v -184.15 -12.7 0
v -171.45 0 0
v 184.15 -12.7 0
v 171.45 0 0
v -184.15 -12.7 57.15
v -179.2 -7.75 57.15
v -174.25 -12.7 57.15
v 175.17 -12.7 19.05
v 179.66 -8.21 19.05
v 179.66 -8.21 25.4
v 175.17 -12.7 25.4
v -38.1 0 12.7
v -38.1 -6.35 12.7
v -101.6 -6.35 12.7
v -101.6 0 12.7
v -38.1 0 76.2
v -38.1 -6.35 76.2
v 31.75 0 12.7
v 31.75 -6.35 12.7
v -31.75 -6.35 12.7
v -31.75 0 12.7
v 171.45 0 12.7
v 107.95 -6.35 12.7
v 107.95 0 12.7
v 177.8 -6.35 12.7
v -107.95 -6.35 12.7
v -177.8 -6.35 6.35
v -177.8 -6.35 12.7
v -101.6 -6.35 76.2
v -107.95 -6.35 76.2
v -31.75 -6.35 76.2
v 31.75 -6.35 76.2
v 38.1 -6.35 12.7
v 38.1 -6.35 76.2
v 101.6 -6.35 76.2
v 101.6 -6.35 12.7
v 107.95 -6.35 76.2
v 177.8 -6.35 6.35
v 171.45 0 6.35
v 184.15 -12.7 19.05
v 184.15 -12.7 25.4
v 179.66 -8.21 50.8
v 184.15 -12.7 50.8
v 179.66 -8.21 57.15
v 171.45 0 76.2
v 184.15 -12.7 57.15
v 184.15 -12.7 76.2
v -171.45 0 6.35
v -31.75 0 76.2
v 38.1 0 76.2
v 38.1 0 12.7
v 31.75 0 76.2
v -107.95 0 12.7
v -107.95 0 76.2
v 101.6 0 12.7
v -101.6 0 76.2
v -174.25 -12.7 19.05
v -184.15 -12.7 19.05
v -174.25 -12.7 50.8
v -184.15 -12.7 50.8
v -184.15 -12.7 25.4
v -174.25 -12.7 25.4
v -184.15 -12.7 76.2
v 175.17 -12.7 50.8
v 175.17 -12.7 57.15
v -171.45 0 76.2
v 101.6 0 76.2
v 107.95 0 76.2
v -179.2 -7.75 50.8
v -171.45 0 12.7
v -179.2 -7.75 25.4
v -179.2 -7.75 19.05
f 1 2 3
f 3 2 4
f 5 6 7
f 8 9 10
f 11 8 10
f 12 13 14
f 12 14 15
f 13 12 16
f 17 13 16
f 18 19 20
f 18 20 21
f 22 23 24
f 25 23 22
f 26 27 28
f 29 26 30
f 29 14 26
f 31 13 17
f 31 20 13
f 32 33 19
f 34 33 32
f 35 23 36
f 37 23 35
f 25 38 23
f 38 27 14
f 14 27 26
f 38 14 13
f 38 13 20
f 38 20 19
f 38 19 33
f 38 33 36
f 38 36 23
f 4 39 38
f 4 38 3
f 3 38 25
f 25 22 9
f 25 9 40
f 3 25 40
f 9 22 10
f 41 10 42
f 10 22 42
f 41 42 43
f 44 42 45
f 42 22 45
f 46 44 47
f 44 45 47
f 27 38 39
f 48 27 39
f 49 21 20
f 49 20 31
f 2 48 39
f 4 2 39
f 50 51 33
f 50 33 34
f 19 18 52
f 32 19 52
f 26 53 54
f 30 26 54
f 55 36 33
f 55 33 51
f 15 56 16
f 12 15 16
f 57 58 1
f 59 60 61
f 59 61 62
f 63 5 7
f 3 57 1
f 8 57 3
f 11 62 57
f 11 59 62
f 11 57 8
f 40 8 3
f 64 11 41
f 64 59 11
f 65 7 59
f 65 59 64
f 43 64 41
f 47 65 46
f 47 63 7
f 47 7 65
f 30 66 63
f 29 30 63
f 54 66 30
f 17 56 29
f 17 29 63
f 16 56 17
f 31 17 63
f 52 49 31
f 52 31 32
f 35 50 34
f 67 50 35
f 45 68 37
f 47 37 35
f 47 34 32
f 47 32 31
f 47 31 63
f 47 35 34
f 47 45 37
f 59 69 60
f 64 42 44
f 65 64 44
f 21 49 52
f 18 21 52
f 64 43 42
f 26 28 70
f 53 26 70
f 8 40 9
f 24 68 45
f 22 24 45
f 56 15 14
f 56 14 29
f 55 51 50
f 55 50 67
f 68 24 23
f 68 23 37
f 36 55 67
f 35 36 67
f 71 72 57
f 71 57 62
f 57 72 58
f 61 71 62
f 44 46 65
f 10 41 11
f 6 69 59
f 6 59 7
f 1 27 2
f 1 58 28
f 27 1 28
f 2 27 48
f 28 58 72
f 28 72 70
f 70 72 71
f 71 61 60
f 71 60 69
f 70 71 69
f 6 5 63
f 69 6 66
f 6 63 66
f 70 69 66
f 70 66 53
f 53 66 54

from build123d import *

# Parameters (mm, degrees)
F0_W      = 368.3
F0_H      = 76.2
F1_DEPTH  = 12.7
F2_W      = 6.35
F2_H      = 6.35
F3_DEPTH  = 368.301
F5_DEPTH  = 76.201
F6_W      = 6.35
F6_H      = 63.5
F7_DEPTH  = 6.35
F8_W      = 7.000554
F8_H      = 6.35
F9_DEPTH  = 260.428428
F10_W     = 6.35
F10_H     = 6.35
F11_DEPTH = 260.428428


with BuildPart() as f1:
    # F0 (on Front) → F1 (new body)
    with BuildSketch(Plane.XZ):
        with Locations((0, 38.1)):
            Rectangle(F0_W, F0_H)
    extrude(amount=F1_DEPTH)

    # F2 (on face) → F3 (cut, through all)
    with BuildSketch(Plane.YZ.offset(184.15)):
        with Locations((-3.175, 9.525)):
            Rectangle(F2_W, F2_H)
    extrude(amount=-F3_DEPTH, mode=Mode.SUBTRACT)

    # F4 (on face) → F5 (cut, through all)
    with BuildSketch(Plane.XY.offset(76.2)):
        Polygon((-184.15, 0), (-184.15, -12.7), (-171.45, 0), align=None)
        Polygon((184.15, -12.7), (184.15, 0), (171.45, 0), align=None)
    extrude(amount=-F5_DEPTH, mode=Mode.SUBTRACT)

    # F6 (on face) → F7 (cut)
    with BuildSketch(Plane(origin=(0, 0, 0), x_dir=(-1, 0, 0), z_dir=(0, 1, 0))):
        with Locations((-104.775, 44.45)):
            Rectangle(F6_W, F6_H)
        with Locations((-34.925, 44.45)):
            Rectangle(F6_W, F6_H)
        with Locations((34.925, 44.45)):
            Rectangle(F6_W, F6_H)
        with Locations((104.775, 44.45)):
            Rectangle(F6_W, F6_H)
    extrude(amount=-F7_DEPTH, mode=Mode.SUBTRACT)

    # F8 (on face) → F9 (cut, through all)
    with BuildSketch(Plane(origin=(-85.725, 85.725, 0), x_dir=(-0.707107, -0.707107, 0), z_dir=(-0.707107, 0.707107, 0))):
        with Locations((135.693693, 53.975)):
            Rectangle(F8_W, F8_H)
        with Locations((135.693693, 22.225)):
            Rectangle(F8_W, F8_H)
    extrude(amount=-F9_DEPTH, mode=Mode.SUBTRACT)

    # F10 (on face) → F11 (cut, through all)
    with BuildSketch(Plane(origin=(85.725, 85.725, 0), x_dir=(-0.707107, 0.707107, 0), z_dir=(0.707107, 0.707107, 0))):
        with Locations((-136.01897, 53.975)):
            Rectangle(F10_W, F10_H)
        with Locations((-136.01897, 22.225)):
            Rectangle(F10_W, F10_H)
    extrude(amount=-F11_DEPTH, mode=Mode.SUBTRACT)


solid = f1.part
